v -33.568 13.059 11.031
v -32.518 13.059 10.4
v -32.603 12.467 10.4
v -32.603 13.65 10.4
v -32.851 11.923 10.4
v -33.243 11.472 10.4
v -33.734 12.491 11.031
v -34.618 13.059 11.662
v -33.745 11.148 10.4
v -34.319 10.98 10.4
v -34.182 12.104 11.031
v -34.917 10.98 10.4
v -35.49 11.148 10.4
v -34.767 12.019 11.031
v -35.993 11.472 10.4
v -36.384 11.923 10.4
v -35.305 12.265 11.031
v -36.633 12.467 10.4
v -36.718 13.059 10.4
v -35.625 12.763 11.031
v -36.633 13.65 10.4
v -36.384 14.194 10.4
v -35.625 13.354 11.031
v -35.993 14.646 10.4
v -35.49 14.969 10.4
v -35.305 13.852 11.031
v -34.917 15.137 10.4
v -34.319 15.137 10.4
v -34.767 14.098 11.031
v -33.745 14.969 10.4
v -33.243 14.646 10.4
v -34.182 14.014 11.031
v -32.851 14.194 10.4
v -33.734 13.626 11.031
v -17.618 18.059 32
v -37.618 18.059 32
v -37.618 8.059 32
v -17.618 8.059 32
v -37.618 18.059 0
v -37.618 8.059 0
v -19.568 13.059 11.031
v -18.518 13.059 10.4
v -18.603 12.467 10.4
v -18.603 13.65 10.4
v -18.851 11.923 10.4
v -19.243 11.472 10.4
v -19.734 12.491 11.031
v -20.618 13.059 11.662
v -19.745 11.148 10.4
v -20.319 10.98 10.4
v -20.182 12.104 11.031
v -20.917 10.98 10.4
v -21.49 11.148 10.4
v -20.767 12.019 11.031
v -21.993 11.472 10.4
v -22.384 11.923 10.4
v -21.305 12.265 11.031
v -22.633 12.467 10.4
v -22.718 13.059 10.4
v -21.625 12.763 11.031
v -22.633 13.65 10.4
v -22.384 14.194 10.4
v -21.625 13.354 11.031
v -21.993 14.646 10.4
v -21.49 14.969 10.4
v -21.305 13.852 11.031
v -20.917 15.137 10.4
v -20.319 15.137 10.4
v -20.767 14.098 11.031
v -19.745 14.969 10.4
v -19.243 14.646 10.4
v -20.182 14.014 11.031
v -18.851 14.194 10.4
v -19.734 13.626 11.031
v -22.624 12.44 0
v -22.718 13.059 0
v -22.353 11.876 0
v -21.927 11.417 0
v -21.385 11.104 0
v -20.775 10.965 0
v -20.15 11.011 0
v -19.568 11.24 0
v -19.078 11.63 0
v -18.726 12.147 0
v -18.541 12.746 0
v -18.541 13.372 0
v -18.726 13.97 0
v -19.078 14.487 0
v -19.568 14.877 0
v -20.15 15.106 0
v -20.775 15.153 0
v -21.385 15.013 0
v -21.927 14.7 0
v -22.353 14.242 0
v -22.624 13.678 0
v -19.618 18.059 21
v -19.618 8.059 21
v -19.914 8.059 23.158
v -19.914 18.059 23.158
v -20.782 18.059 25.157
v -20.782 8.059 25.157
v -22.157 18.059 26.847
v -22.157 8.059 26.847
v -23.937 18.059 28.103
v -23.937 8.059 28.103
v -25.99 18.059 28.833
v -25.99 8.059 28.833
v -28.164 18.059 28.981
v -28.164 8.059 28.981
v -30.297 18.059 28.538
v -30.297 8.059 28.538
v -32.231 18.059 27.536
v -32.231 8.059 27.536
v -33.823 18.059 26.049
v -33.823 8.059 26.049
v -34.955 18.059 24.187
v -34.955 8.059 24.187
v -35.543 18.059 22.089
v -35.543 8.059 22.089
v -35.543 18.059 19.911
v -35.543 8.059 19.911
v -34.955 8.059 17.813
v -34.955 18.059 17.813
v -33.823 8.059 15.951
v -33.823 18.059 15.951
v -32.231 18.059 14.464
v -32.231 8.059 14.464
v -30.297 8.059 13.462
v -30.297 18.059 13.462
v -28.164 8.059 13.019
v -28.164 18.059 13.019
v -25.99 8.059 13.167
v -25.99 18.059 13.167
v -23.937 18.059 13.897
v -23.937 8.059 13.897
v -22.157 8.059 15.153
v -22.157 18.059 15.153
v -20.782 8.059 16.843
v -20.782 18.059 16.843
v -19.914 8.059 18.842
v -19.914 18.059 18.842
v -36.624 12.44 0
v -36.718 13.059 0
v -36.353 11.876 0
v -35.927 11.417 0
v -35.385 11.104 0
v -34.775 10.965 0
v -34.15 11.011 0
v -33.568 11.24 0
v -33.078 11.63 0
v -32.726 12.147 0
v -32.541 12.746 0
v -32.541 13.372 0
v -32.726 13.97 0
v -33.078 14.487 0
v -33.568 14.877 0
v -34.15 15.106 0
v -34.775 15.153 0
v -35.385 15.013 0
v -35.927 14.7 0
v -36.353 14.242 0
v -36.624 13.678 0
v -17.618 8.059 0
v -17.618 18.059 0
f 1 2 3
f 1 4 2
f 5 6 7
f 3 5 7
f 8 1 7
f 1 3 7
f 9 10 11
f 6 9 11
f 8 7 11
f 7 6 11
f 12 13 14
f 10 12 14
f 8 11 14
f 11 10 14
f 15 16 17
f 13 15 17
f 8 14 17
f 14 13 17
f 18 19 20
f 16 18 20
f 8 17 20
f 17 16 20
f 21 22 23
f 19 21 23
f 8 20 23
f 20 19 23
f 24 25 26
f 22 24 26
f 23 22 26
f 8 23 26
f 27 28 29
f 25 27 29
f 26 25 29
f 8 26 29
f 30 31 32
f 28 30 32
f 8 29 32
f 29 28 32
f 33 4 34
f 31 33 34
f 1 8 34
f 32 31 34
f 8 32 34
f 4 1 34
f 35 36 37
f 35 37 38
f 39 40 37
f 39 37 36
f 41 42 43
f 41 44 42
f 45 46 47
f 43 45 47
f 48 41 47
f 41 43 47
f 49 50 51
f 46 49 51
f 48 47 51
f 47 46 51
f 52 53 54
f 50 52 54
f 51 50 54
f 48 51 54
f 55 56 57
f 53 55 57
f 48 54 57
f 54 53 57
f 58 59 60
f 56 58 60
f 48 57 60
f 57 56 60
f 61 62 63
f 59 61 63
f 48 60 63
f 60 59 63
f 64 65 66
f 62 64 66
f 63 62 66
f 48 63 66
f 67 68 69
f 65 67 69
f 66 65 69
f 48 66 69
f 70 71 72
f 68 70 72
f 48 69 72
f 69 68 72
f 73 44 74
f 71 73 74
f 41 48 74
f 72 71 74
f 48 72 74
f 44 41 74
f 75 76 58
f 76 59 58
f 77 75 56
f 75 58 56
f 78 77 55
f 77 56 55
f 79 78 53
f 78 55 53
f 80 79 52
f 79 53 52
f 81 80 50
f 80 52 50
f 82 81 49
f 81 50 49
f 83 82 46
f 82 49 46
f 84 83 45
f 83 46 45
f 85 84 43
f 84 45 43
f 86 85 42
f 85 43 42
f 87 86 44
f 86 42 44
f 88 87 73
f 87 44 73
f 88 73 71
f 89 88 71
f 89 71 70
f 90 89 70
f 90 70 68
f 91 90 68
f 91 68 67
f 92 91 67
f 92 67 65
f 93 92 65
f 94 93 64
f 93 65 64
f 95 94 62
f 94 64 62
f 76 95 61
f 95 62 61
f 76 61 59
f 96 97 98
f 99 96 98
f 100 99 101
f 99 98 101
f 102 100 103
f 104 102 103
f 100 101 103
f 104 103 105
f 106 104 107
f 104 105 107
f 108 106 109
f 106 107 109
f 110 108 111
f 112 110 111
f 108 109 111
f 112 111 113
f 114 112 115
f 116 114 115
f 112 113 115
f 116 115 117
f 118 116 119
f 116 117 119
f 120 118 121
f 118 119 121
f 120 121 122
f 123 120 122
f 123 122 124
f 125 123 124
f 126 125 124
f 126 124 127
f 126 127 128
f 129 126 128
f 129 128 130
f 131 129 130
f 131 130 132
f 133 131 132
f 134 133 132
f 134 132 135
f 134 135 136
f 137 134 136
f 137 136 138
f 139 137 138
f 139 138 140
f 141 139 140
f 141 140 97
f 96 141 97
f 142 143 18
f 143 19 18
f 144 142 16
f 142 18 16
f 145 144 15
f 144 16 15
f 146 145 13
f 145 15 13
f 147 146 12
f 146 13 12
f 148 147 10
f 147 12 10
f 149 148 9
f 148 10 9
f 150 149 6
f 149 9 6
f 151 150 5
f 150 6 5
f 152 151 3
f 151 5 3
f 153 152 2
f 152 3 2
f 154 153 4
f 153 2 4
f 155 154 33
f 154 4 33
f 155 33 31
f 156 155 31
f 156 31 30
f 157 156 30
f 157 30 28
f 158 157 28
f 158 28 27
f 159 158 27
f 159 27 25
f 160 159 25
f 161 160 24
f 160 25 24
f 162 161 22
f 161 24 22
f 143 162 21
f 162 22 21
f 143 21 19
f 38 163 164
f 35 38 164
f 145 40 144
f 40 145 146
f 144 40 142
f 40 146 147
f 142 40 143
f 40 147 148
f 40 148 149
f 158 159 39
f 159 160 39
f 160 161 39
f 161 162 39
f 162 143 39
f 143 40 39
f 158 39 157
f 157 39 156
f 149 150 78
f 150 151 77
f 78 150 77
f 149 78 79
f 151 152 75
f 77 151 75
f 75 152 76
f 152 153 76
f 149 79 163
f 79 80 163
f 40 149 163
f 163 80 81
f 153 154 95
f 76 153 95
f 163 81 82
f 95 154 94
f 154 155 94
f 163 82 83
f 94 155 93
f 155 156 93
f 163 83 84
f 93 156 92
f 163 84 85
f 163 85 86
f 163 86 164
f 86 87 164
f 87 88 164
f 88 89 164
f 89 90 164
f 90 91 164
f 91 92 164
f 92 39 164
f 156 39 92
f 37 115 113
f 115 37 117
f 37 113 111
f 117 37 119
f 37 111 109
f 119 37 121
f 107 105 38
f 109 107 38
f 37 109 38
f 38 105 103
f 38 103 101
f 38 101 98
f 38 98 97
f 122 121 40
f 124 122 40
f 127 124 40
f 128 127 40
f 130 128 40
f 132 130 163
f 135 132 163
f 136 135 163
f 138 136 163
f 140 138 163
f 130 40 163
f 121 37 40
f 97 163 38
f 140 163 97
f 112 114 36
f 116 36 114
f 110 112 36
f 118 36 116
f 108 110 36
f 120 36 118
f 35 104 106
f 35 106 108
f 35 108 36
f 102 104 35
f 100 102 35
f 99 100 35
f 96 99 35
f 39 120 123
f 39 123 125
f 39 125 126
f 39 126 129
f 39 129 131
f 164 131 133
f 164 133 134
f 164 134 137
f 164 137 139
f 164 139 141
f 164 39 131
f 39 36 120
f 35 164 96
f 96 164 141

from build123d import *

# Parameters (mm, degrees)
F0_W     = 20
F0_H     = 10
F1_DEPTH = 32
F2_R     = 8
F3_DEPTH = 25
F5_D     = 4.2
F5_DEPTH = 10.4
F5_TIP   = 1.2618073


with BuildPart() as f1:
    # F0 (on Top) → F1 (new body)
    with BuildSketch(Plane.XY):
        with Locations((-27.6177362539, 13.0586402248)):
            Rectangle(F0_W, F0_H)
    extrude(amount=F1_DEPTH)

    # F2 (on face) → F3 (cut)
    with BuildSketch(Plane.XZ.offset(-8.0586402248)):
        with Locations((-27.6177362539, 21)):
            Circle(F2_R)
    extrude(amount=-F3_DEPTH, mode=Mode.SUBTRACT)

    # F5
    with Locations(Plane(origin=(0, 0, 0), x_dir=(1, 0, 0), z_dir=(0, 0, -1))):
        with Locations((-34.6177362539, -13.0586402248), (-20.6177362539, -13.0586402248)):
            Hole(F5_D / 2, depth=F5_DEPTH)
            with Locations((0, 0, -(F5_DEPTH + F5_TIP / 2))):  # 118° drill point
                Cone(0, F5_D / 2, F5_TIP, mode=Mode.SUBTRACT)


solid = f1.part
